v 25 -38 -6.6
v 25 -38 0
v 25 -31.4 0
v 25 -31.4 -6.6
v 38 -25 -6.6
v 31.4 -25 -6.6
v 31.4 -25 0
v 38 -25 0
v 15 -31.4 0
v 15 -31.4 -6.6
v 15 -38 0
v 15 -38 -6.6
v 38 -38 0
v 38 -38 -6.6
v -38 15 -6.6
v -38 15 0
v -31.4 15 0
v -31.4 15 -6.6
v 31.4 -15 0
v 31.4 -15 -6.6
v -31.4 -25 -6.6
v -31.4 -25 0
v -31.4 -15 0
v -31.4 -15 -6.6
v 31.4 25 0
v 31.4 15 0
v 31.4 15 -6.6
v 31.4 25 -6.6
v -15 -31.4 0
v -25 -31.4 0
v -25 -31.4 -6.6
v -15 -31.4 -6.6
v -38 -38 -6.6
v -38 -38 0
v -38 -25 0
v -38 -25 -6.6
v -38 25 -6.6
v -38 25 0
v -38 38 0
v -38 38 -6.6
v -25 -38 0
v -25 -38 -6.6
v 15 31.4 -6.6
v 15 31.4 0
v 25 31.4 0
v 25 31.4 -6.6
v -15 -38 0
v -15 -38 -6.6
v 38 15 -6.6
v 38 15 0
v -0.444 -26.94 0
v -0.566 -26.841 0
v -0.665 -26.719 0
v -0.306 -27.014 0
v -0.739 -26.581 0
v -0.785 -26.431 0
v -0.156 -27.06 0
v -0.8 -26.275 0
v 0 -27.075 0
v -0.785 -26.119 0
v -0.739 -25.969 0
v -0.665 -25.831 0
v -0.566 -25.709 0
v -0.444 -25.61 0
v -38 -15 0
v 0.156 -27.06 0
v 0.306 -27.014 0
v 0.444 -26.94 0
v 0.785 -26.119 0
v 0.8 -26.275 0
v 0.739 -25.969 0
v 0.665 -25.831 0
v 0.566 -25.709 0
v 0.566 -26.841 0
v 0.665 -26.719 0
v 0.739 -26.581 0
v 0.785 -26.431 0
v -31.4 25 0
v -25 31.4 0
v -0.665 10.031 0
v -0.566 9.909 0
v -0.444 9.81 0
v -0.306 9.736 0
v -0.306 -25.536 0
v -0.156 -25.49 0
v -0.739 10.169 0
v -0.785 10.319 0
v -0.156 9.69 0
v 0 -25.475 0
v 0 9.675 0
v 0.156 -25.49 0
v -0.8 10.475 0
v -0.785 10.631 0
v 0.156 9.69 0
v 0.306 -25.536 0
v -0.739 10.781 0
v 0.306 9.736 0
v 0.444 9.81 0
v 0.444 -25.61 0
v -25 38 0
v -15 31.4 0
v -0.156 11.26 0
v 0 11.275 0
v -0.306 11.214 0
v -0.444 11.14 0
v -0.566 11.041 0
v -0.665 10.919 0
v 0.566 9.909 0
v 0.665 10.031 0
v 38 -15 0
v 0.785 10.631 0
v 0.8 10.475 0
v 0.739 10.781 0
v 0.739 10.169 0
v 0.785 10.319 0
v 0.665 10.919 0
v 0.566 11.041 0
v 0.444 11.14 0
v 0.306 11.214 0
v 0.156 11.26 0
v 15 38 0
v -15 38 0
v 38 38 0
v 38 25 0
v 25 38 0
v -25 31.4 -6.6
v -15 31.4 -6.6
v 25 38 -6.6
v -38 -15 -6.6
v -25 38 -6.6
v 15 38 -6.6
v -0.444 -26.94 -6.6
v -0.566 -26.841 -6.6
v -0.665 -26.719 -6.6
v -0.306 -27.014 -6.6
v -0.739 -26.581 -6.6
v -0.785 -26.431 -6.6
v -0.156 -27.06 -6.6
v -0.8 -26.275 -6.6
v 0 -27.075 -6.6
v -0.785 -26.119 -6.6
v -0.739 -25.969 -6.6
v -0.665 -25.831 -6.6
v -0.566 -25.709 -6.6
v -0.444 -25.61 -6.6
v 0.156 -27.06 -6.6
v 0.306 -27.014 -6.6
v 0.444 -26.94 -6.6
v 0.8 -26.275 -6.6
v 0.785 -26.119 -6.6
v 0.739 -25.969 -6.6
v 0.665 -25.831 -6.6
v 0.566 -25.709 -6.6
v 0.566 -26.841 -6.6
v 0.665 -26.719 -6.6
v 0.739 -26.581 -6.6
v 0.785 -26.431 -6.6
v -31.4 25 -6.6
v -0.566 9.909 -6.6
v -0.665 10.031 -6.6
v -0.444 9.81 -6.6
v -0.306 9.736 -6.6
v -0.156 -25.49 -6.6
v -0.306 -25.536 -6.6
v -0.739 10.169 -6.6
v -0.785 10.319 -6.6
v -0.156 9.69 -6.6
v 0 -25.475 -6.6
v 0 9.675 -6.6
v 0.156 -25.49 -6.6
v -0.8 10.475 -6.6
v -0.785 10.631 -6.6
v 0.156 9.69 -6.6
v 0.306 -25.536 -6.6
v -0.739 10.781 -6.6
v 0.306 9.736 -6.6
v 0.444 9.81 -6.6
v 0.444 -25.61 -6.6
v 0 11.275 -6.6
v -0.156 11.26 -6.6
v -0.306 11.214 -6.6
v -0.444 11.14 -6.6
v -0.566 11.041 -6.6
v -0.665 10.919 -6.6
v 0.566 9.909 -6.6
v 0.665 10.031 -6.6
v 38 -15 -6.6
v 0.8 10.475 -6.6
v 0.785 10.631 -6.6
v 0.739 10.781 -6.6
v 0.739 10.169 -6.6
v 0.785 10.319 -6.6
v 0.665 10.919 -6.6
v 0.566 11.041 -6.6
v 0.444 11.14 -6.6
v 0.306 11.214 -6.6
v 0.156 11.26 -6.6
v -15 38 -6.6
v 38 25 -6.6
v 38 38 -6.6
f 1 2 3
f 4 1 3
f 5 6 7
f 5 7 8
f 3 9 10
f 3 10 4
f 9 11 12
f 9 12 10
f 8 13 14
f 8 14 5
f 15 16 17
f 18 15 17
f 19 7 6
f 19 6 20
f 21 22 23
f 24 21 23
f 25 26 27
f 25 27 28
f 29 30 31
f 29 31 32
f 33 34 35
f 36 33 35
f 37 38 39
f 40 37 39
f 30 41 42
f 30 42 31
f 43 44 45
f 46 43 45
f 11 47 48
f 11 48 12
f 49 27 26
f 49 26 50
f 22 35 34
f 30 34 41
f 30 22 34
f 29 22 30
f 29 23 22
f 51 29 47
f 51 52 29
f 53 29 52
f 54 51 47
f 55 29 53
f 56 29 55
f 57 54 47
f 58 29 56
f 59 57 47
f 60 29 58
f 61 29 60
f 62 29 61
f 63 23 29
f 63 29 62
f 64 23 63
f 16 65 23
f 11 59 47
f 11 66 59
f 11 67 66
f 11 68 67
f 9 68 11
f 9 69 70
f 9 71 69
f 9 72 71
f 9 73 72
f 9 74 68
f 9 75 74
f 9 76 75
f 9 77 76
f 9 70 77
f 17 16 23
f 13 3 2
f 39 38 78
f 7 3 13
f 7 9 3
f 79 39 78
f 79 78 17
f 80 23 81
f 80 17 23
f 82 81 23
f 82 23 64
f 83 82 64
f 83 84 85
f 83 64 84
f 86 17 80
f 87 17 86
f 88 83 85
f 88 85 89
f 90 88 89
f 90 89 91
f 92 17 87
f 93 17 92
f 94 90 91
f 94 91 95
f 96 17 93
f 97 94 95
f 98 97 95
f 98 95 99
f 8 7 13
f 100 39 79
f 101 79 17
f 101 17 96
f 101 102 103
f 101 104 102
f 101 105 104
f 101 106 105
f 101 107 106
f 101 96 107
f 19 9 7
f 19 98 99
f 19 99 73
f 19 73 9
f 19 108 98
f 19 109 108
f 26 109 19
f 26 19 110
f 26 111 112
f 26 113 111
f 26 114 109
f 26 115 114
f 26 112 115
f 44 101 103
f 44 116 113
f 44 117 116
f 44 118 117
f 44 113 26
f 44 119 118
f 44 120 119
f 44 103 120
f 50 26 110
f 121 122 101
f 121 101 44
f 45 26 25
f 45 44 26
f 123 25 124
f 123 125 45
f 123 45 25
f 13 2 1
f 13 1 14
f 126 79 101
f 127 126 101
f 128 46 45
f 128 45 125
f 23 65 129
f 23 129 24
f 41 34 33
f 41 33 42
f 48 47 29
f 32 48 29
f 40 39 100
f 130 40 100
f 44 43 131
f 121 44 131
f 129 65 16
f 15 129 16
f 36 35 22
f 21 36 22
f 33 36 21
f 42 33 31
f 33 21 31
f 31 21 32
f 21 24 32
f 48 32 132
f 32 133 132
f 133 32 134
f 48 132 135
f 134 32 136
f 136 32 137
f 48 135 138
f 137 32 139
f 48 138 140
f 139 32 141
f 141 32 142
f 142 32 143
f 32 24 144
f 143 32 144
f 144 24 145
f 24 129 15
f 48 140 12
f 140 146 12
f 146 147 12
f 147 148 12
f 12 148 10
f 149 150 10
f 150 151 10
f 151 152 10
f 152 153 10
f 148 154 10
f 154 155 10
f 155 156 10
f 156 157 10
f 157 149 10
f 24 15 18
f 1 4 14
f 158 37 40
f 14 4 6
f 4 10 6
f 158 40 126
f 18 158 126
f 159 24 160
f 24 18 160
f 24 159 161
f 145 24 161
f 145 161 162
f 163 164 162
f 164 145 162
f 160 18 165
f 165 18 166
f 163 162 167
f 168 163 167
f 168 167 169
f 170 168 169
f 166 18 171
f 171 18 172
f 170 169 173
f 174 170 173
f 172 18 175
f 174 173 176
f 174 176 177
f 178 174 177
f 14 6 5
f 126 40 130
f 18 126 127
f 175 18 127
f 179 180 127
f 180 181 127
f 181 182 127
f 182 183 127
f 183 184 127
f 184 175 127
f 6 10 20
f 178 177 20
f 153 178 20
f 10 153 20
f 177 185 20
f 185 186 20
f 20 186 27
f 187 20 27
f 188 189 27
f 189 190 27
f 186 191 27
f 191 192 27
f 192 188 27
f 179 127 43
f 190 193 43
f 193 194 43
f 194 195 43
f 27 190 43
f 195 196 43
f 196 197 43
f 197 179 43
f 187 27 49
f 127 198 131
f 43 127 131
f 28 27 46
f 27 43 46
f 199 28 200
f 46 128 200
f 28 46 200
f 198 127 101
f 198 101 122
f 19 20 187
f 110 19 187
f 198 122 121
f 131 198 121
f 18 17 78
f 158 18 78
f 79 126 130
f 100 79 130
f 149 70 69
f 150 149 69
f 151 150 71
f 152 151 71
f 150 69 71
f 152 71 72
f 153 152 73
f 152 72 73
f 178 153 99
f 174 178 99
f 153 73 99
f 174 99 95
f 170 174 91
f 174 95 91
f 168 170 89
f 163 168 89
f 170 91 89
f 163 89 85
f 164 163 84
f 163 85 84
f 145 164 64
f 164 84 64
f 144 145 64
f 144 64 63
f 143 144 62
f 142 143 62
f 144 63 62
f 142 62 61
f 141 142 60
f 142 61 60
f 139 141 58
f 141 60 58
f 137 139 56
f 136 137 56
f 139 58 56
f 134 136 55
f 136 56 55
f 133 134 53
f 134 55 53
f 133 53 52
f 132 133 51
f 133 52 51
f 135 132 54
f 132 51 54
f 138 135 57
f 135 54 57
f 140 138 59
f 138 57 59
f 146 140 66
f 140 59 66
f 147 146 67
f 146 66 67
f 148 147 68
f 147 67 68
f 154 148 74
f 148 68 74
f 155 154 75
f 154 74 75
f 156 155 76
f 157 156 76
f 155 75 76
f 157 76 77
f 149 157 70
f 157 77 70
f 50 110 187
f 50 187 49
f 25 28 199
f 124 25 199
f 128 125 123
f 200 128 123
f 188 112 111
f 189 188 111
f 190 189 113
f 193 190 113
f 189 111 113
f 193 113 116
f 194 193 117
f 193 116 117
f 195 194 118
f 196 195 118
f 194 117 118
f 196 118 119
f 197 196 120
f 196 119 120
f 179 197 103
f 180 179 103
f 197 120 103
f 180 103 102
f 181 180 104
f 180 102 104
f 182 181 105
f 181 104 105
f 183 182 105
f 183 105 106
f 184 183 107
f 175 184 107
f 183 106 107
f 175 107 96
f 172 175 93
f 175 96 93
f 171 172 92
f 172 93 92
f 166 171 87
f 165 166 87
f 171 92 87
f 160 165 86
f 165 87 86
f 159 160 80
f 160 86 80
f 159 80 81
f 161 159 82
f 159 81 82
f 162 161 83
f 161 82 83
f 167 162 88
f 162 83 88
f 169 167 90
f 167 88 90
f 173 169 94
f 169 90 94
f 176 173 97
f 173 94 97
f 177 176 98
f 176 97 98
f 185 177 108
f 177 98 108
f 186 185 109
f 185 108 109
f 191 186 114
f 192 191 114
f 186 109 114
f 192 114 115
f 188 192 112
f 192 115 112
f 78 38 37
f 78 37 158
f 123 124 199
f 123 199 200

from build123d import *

# Parameters (mm, degrees)
F0_W     = 76
F0_H     = 76
F1_DEPTH = 6.6
F2_W     = 10
F2_H     = 6.6
F2_W_2   = 6.6
F2_H_2   = 10
F3_DEPTH = 6.6
F4_R     = 0.8
F5_DEPTH = 6.6


with BuildPart() as f1:
    # F0 (on Top) → F1 (new body)
    with BuildSketch(Plane.XY):
        Rectangle(F0_W, F0_H)
    extrude(amount=-F1_DEPTH)

    # F2 (on face) → F3 (cut, through all)
    with BuildSketch(Plane.XY):
        with Locations((20, 34.7)):
            Rectangle(F2_W, F2_H)
        with Locations((-20, 34.7)):
            Rectangle(F2_W, F2_H)
        with Locations((-34.7, -20)):
            Rectangle(F2_W_2, F2_H_2)
        with Locations((-34.7, 20)):
            Rectangle(F2_W_2, F2_H_2)
        with Locations((20, -34.7)):
            Rectangle(F2_W, F2_H)
        with Locations((-20, -34.7)):
            Rectangle(F2_W, F2_H)
        with Locations((34.7, 20)):
            Rectangle(F2_W_2, F2_H_2)
        with Locations((34.7, -20)):
            Rectangle(F2_W_2, F2_H_2)
    extrude(amount=-F3_DEPTH, mode=Mode.SUBTRACT)

    # F4 (on face) → F5 (cut, through all)
    with BuildSketch(Plane.XY):
        with Locations((0, 10.475)):
            Circle(F4_R)
        with Locations((0, -26.275)):
            Circle(F4_R)
    extrude(amount=-F5_DEPTH, mode=Mode.SUBTRACT)


solid = f1.part
